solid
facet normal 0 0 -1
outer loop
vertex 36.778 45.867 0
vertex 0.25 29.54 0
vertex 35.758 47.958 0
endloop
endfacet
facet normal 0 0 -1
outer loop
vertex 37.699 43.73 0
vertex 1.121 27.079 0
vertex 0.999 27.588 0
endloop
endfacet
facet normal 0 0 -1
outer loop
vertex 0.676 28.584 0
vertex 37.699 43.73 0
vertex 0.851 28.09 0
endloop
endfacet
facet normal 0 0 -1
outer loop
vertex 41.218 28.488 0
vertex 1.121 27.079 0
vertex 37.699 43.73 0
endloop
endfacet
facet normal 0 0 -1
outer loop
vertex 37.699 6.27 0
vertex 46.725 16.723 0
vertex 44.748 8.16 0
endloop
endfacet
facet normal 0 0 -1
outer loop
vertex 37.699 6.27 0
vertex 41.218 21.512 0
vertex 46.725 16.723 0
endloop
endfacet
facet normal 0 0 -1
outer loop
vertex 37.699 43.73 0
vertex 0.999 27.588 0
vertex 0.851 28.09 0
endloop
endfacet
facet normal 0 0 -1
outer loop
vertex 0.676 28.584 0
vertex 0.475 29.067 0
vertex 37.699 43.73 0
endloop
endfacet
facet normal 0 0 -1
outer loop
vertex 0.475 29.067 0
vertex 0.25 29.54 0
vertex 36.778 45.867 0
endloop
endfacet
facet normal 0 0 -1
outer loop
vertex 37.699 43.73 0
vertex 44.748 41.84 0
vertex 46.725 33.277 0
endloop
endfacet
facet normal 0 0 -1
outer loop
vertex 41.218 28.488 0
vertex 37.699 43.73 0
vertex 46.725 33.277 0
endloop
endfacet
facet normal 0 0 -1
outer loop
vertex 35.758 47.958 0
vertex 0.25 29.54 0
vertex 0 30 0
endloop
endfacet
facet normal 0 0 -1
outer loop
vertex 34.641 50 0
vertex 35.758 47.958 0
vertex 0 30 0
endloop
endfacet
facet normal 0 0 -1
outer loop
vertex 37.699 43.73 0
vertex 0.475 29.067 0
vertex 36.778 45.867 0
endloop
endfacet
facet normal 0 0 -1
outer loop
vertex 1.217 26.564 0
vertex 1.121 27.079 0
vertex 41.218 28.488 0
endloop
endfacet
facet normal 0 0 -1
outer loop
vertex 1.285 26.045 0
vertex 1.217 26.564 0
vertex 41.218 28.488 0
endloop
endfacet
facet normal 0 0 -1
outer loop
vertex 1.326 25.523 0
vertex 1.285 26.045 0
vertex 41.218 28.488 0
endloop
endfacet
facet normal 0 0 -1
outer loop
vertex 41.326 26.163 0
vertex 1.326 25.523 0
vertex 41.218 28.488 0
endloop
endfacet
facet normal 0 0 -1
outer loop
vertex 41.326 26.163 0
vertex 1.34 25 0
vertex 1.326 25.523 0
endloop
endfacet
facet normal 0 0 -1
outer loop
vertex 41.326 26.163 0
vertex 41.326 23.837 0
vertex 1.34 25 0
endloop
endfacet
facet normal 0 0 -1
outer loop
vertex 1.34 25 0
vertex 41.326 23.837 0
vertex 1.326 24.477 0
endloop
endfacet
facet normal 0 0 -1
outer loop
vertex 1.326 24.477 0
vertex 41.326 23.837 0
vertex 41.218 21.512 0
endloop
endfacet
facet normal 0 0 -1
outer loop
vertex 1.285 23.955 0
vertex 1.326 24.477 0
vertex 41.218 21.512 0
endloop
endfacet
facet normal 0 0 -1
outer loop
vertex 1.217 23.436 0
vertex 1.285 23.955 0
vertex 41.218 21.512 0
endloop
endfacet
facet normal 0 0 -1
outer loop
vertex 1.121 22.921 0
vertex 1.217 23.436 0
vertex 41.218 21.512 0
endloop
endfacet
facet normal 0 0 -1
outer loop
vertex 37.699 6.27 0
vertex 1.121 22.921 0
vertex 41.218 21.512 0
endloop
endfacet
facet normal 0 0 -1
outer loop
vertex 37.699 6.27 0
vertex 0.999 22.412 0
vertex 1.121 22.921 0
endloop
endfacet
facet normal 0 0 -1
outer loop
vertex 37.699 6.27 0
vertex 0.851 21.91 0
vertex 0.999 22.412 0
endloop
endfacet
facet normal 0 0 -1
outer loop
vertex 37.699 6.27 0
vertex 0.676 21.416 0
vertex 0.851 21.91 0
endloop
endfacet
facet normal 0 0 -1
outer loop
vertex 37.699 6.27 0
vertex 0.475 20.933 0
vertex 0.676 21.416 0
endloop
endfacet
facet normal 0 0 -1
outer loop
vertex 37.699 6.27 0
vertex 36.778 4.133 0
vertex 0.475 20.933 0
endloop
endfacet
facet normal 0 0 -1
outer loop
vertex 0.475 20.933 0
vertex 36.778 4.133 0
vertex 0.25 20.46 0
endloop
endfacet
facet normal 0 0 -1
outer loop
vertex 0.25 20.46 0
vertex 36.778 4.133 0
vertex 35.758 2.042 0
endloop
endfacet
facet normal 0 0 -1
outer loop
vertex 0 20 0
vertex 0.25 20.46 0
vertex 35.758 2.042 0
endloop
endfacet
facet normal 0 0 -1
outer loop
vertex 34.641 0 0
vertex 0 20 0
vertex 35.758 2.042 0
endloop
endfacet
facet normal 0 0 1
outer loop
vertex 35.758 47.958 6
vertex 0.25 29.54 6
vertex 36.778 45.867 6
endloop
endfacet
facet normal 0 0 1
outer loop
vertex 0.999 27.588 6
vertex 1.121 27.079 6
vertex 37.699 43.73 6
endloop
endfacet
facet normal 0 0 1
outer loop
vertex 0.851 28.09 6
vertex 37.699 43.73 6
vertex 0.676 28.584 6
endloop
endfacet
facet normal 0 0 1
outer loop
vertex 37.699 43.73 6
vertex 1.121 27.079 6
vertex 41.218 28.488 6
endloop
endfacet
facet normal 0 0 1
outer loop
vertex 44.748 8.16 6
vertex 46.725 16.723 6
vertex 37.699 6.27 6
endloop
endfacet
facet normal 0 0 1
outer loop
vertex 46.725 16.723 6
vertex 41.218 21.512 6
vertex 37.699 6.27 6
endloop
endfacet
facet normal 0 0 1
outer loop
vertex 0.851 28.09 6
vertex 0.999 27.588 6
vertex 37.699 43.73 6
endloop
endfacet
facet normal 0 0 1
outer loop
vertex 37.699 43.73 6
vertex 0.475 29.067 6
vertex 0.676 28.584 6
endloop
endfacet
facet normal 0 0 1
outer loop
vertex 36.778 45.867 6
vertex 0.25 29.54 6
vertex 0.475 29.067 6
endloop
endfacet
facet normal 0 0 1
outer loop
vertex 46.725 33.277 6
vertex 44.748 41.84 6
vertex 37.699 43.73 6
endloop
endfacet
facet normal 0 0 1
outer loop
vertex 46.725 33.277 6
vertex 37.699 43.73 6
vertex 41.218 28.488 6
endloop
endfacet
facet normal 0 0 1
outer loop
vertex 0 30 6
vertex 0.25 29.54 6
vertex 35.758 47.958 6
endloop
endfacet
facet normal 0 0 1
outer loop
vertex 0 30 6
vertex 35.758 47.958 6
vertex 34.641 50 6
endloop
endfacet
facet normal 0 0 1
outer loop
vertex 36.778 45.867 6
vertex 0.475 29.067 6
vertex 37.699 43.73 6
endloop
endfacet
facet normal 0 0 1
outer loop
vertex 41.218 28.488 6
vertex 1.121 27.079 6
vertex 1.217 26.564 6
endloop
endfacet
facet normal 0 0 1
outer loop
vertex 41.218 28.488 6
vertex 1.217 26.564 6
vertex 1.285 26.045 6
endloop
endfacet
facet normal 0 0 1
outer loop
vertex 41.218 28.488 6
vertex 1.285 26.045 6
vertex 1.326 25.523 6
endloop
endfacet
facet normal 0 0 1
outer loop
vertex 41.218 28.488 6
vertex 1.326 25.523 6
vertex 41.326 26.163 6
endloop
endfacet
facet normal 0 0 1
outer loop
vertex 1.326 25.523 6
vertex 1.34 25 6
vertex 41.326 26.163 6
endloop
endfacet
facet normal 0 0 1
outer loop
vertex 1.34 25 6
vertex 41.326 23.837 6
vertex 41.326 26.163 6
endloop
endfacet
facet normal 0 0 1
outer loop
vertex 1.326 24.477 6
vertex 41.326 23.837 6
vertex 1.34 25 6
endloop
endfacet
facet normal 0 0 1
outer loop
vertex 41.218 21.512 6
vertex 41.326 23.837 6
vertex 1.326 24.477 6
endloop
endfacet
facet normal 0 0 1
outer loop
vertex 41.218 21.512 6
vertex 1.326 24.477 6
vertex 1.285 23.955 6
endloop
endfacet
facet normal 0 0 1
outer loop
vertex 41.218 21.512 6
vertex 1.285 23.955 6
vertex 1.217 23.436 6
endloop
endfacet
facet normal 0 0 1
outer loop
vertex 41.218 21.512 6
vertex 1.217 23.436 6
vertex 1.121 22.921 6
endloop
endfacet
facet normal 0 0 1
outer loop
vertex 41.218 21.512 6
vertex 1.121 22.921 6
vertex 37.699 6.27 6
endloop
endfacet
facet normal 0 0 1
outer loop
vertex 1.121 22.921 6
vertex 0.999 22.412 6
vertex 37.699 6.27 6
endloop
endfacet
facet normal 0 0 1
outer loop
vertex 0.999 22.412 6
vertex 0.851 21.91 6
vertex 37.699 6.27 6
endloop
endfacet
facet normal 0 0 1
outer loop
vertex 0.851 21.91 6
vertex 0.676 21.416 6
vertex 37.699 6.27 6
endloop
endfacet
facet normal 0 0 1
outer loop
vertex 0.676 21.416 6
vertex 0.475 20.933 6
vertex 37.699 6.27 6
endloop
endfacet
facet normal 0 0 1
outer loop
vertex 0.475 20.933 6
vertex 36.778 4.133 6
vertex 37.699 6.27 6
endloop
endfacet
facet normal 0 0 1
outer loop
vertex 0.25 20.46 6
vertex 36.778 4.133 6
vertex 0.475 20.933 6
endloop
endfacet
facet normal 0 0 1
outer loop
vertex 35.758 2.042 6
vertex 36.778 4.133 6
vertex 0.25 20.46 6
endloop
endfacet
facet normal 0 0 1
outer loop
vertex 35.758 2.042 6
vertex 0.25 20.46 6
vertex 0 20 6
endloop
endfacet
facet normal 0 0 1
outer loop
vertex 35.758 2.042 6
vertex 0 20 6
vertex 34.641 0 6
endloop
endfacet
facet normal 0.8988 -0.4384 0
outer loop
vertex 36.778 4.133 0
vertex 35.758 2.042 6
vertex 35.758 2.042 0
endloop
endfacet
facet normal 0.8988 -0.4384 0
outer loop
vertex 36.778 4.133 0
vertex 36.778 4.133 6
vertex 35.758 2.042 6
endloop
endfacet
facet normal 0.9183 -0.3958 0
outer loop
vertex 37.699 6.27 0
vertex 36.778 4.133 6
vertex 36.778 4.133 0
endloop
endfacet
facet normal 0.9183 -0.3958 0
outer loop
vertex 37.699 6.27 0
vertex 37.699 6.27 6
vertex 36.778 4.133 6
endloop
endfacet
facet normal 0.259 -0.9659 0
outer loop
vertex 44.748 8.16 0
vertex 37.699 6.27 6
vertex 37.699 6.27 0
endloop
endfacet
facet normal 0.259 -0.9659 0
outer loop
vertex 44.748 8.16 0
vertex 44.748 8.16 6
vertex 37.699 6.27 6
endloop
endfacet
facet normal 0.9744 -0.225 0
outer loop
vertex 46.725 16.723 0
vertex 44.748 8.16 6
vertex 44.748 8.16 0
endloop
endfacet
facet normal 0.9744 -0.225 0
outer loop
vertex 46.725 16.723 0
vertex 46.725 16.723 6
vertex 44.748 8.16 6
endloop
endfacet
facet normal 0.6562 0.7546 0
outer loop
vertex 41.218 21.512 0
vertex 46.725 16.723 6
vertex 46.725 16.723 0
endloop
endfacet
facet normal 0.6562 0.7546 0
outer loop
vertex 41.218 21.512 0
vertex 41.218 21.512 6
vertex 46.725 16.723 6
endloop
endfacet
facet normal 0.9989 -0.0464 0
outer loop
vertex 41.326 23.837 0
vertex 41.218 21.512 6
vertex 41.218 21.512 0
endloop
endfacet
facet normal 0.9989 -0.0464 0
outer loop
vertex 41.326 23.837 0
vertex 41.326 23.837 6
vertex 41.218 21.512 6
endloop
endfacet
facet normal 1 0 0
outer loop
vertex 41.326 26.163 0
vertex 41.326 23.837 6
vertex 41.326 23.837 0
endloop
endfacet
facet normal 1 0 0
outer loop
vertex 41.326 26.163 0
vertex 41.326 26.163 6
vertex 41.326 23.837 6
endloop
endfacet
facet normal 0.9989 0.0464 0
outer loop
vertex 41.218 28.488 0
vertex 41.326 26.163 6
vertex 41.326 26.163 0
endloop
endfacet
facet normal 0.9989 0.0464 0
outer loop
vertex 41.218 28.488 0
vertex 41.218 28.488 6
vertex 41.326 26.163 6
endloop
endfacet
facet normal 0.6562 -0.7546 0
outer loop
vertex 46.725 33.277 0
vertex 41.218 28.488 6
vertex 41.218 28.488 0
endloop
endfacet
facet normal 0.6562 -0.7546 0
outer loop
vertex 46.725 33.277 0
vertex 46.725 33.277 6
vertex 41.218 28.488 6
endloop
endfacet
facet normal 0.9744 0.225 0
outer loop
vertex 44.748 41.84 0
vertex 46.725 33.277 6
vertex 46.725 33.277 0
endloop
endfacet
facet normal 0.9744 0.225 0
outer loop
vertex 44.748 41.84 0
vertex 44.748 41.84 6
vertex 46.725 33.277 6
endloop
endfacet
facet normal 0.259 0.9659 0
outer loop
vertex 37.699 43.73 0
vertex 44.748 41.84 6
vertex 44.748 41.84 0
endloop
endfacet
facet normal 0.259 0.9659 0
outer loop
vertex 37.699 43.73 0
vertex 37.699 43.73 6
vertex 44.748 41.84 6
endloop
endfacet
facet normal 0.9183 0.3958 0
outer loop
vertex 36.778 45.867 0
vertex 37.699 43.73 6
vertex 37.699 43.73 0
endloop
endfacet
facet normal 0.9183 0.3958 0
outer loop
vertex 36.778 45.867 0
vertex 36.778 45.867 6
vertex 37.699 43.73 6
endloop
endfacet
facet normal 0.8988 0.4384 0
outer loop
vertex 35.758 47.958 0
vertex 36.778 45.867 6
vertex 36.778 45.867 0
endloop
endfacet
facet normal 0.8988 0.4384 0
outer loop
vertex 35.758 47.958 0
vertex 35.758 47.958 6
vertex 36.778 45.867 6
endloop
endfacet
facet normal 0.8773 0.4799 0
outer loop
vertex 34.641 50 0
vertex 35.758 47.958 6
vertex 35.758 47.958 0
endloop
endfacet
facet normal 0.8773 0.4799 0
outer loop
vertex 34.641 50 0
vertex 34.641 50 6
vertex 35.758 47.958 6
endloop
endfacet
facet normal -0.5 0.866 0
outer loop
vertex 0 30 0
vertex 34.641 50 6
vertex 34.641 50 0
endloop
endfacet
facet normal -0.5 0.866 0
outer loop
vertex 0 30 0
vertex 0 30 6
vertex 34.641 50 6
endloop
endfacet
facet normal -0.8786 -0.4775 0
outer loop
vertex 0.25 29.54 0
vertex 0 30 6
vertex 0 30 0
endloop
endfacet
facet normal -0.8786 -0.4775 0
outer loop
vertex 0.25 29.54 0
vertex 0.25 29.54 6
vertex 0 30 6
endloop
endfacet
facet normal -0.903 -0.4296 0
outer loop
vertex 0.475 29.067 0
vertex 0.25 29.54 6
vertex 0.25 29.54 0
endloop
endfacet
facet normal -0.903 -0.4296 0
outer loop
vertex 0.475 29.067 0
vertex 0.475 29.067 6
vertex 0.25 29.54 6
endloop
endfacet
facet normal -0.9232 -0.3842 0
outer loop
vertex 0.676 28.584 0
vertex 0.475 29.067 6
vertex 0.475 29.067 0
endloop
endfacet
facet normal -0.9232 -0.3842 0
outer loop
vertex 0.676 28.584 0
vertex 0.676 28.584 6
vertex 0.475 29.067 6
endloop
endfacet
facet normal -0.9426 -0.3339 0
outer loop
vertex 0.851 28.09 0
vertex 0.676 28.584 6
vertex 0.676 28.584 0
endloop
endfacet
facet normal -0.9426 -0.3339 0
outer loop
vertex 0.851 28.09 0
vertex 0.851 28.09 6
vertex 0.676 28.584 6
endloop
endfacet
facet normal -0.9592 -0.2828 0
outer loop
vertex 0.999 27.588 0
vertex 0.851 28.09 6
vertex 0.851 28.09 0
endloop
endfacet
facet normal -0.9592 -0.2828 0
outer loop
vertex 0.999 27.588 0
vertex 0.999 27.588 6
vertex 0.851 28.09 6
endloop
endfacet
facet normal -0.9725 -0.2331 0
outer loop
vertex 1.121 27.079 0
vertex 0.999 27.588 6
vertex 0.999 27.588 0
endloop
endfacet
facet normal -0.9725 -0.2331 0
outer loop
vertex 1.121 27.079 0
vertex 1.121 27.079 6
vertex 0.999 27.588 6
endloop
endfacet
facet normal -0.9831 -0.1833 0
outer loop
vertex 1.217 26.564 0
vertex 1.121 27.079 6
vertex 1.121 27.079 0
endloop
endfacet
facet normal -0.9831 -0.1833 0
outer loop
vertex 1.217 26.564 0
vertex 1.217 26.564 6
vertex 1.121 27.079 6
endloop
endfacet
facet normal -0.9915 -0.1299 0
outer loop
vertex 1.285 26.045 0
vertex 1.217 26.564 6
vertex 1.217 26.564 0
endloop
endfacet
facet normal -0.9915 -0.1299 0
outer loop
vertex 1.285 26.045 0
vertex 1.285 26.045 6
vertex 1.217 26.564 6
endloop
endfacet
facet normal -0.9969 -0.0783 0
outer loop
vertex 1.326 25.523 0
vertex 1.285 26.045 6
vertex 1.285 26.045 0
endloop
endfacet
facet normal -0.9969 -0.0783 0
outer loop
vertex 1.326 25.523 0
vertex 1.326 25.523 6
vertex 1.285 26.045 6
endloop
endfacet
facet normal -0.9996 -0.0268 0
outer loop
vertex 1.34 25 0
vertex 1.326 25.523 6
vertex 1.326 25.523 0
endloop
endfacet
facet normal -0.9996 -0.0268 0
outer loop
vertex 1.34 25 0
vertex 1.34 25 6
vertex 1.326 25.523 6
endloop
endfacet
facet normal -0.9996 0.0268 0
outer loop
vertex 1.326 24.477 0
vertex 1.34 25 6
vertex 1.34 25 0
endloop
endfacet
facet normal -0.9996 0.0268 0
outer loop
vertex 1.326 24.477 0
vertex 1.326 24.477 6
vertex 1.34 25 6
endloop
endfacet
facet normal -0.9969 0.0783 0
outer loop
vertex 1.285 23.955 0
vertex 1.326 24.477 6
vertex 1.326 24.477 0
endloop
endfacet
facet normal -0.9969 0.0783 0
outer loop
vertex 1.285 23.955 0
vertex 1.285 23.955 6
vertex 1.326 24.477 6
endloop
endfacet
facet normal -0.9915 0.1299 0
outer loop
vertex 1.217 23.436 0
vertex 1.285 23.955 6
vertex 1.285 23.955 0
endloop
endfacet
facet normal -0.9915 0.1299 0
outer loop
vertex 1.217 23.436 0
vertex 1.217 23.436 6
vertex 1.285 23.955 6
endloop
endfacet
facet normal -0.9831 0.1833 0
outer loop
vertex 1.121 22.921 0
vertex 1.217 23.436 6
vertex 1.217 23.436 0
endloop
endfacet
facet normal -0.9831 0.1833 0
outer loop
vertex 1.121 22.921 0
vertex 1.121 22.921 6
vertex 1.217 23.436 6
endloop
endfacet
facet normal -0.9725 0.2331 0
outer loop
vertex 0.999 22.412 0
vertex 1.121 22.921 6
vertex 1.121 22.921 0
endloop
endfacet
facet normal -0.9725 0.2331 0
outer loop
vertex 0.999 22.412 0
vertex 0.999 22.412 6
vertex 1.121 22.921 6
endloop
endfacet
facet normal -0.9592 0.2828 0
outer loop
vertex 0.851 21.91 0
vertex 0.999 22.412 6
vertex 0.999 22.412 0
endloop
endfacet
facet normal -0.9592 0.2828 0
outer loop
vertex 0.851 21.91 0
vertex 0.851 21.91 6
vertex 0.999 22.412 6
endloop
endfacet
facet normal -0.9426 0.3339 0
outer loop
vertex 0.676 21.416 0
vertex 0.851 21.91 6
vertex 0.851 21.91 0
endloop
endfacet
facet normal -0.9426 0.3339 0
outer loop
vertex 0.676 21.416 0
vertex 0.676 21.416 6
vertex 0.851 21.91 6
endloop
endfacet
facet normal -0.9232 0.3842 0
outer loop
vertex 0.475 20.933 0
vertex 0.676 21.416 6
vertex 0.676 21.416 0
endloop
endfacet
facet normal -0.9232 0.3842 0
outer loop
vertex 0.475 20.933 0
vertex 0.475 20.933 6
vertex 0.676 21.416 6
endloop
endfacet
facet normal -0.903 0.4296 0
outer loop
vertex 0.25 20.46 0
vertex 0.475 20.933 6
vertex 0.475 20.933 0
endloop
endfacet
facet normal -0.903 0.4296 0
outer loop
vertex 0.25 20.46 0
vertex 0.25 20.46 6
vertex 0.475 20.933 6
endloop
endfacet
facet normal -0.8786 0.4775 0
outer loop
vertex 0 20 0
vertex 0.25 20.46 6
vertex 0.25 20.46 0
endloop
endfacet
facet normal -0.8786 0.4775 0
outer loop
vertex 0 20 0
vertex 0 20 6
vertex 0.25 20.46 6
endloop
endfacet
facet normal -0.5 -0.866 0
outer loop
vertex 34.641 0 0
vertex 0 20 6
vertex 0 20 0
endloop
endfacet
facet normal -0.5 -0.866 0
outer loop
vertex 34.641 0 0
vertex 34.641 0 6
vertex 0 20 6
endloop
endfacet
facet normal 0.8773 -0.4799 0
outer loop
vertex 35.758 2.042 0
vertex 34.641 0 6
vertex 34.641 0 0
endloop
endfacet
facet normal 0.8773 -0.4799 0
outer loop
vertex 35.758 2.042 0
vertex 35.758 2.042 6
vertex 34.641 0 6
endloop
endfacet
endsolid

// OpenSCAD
$fn = 32;

// ----------------------------------------------------------------------
// Gear sector: 2 teeth on 60 degrees
// ----------------------------------------------------------------------

// --- parameters (mm) ---
sector_angle = 60;        // sector angle, degrees
root_r = 50;              // root circle radius
tooth_h = 6;              // tooth height over the root circle
teeth = 2;                // number of teeth on the sector
hub_r = 10;               // hub bore radius
plate_t = 6;              // sector thickness, Z
arc_step = 3;             // sampling step of the root/hub arcs, degrees

tip_r = root_r + tooth_h;  // tip circle radius

profile = [[34.641, 0], [35.758, 2.042], [36.778, 4.133], [37.699, 6.27], [44.748, 8.16], [46.725, 16.723], [41.218, 21.512], [41.326, 23.837], [41.326, 26.163], [41.218, 28.488], [46.725, 33.277], [44.748, 41.84], [37.699, 43.73], [36.778, 45.867], [35.758, 47.958], [34.641, 50], [0, 30], [0.25, 29.54], [0.475, 29.067], [0.676, 28.584], [0.851, 28.09], [0.999, 27.588], [1.121, 27.079], [1.217, 26.564], [1.285, 26.045], [1.326, 25.523], [1.34, 25], [1.326, 24.477], [1.285, 23.955], [1.217, 23.436], [1.121, 22.921], [0.999, 22.412], [0.851, 21.91], [0.676, 21.416], [0.475, 20.933], [0.25, 20.46], [0, 20]];  // primary outline, 37 points, counter clockwise

// --- the one profile operation ---
linear_extrude(height = plate_t) polygon(points = profile);
